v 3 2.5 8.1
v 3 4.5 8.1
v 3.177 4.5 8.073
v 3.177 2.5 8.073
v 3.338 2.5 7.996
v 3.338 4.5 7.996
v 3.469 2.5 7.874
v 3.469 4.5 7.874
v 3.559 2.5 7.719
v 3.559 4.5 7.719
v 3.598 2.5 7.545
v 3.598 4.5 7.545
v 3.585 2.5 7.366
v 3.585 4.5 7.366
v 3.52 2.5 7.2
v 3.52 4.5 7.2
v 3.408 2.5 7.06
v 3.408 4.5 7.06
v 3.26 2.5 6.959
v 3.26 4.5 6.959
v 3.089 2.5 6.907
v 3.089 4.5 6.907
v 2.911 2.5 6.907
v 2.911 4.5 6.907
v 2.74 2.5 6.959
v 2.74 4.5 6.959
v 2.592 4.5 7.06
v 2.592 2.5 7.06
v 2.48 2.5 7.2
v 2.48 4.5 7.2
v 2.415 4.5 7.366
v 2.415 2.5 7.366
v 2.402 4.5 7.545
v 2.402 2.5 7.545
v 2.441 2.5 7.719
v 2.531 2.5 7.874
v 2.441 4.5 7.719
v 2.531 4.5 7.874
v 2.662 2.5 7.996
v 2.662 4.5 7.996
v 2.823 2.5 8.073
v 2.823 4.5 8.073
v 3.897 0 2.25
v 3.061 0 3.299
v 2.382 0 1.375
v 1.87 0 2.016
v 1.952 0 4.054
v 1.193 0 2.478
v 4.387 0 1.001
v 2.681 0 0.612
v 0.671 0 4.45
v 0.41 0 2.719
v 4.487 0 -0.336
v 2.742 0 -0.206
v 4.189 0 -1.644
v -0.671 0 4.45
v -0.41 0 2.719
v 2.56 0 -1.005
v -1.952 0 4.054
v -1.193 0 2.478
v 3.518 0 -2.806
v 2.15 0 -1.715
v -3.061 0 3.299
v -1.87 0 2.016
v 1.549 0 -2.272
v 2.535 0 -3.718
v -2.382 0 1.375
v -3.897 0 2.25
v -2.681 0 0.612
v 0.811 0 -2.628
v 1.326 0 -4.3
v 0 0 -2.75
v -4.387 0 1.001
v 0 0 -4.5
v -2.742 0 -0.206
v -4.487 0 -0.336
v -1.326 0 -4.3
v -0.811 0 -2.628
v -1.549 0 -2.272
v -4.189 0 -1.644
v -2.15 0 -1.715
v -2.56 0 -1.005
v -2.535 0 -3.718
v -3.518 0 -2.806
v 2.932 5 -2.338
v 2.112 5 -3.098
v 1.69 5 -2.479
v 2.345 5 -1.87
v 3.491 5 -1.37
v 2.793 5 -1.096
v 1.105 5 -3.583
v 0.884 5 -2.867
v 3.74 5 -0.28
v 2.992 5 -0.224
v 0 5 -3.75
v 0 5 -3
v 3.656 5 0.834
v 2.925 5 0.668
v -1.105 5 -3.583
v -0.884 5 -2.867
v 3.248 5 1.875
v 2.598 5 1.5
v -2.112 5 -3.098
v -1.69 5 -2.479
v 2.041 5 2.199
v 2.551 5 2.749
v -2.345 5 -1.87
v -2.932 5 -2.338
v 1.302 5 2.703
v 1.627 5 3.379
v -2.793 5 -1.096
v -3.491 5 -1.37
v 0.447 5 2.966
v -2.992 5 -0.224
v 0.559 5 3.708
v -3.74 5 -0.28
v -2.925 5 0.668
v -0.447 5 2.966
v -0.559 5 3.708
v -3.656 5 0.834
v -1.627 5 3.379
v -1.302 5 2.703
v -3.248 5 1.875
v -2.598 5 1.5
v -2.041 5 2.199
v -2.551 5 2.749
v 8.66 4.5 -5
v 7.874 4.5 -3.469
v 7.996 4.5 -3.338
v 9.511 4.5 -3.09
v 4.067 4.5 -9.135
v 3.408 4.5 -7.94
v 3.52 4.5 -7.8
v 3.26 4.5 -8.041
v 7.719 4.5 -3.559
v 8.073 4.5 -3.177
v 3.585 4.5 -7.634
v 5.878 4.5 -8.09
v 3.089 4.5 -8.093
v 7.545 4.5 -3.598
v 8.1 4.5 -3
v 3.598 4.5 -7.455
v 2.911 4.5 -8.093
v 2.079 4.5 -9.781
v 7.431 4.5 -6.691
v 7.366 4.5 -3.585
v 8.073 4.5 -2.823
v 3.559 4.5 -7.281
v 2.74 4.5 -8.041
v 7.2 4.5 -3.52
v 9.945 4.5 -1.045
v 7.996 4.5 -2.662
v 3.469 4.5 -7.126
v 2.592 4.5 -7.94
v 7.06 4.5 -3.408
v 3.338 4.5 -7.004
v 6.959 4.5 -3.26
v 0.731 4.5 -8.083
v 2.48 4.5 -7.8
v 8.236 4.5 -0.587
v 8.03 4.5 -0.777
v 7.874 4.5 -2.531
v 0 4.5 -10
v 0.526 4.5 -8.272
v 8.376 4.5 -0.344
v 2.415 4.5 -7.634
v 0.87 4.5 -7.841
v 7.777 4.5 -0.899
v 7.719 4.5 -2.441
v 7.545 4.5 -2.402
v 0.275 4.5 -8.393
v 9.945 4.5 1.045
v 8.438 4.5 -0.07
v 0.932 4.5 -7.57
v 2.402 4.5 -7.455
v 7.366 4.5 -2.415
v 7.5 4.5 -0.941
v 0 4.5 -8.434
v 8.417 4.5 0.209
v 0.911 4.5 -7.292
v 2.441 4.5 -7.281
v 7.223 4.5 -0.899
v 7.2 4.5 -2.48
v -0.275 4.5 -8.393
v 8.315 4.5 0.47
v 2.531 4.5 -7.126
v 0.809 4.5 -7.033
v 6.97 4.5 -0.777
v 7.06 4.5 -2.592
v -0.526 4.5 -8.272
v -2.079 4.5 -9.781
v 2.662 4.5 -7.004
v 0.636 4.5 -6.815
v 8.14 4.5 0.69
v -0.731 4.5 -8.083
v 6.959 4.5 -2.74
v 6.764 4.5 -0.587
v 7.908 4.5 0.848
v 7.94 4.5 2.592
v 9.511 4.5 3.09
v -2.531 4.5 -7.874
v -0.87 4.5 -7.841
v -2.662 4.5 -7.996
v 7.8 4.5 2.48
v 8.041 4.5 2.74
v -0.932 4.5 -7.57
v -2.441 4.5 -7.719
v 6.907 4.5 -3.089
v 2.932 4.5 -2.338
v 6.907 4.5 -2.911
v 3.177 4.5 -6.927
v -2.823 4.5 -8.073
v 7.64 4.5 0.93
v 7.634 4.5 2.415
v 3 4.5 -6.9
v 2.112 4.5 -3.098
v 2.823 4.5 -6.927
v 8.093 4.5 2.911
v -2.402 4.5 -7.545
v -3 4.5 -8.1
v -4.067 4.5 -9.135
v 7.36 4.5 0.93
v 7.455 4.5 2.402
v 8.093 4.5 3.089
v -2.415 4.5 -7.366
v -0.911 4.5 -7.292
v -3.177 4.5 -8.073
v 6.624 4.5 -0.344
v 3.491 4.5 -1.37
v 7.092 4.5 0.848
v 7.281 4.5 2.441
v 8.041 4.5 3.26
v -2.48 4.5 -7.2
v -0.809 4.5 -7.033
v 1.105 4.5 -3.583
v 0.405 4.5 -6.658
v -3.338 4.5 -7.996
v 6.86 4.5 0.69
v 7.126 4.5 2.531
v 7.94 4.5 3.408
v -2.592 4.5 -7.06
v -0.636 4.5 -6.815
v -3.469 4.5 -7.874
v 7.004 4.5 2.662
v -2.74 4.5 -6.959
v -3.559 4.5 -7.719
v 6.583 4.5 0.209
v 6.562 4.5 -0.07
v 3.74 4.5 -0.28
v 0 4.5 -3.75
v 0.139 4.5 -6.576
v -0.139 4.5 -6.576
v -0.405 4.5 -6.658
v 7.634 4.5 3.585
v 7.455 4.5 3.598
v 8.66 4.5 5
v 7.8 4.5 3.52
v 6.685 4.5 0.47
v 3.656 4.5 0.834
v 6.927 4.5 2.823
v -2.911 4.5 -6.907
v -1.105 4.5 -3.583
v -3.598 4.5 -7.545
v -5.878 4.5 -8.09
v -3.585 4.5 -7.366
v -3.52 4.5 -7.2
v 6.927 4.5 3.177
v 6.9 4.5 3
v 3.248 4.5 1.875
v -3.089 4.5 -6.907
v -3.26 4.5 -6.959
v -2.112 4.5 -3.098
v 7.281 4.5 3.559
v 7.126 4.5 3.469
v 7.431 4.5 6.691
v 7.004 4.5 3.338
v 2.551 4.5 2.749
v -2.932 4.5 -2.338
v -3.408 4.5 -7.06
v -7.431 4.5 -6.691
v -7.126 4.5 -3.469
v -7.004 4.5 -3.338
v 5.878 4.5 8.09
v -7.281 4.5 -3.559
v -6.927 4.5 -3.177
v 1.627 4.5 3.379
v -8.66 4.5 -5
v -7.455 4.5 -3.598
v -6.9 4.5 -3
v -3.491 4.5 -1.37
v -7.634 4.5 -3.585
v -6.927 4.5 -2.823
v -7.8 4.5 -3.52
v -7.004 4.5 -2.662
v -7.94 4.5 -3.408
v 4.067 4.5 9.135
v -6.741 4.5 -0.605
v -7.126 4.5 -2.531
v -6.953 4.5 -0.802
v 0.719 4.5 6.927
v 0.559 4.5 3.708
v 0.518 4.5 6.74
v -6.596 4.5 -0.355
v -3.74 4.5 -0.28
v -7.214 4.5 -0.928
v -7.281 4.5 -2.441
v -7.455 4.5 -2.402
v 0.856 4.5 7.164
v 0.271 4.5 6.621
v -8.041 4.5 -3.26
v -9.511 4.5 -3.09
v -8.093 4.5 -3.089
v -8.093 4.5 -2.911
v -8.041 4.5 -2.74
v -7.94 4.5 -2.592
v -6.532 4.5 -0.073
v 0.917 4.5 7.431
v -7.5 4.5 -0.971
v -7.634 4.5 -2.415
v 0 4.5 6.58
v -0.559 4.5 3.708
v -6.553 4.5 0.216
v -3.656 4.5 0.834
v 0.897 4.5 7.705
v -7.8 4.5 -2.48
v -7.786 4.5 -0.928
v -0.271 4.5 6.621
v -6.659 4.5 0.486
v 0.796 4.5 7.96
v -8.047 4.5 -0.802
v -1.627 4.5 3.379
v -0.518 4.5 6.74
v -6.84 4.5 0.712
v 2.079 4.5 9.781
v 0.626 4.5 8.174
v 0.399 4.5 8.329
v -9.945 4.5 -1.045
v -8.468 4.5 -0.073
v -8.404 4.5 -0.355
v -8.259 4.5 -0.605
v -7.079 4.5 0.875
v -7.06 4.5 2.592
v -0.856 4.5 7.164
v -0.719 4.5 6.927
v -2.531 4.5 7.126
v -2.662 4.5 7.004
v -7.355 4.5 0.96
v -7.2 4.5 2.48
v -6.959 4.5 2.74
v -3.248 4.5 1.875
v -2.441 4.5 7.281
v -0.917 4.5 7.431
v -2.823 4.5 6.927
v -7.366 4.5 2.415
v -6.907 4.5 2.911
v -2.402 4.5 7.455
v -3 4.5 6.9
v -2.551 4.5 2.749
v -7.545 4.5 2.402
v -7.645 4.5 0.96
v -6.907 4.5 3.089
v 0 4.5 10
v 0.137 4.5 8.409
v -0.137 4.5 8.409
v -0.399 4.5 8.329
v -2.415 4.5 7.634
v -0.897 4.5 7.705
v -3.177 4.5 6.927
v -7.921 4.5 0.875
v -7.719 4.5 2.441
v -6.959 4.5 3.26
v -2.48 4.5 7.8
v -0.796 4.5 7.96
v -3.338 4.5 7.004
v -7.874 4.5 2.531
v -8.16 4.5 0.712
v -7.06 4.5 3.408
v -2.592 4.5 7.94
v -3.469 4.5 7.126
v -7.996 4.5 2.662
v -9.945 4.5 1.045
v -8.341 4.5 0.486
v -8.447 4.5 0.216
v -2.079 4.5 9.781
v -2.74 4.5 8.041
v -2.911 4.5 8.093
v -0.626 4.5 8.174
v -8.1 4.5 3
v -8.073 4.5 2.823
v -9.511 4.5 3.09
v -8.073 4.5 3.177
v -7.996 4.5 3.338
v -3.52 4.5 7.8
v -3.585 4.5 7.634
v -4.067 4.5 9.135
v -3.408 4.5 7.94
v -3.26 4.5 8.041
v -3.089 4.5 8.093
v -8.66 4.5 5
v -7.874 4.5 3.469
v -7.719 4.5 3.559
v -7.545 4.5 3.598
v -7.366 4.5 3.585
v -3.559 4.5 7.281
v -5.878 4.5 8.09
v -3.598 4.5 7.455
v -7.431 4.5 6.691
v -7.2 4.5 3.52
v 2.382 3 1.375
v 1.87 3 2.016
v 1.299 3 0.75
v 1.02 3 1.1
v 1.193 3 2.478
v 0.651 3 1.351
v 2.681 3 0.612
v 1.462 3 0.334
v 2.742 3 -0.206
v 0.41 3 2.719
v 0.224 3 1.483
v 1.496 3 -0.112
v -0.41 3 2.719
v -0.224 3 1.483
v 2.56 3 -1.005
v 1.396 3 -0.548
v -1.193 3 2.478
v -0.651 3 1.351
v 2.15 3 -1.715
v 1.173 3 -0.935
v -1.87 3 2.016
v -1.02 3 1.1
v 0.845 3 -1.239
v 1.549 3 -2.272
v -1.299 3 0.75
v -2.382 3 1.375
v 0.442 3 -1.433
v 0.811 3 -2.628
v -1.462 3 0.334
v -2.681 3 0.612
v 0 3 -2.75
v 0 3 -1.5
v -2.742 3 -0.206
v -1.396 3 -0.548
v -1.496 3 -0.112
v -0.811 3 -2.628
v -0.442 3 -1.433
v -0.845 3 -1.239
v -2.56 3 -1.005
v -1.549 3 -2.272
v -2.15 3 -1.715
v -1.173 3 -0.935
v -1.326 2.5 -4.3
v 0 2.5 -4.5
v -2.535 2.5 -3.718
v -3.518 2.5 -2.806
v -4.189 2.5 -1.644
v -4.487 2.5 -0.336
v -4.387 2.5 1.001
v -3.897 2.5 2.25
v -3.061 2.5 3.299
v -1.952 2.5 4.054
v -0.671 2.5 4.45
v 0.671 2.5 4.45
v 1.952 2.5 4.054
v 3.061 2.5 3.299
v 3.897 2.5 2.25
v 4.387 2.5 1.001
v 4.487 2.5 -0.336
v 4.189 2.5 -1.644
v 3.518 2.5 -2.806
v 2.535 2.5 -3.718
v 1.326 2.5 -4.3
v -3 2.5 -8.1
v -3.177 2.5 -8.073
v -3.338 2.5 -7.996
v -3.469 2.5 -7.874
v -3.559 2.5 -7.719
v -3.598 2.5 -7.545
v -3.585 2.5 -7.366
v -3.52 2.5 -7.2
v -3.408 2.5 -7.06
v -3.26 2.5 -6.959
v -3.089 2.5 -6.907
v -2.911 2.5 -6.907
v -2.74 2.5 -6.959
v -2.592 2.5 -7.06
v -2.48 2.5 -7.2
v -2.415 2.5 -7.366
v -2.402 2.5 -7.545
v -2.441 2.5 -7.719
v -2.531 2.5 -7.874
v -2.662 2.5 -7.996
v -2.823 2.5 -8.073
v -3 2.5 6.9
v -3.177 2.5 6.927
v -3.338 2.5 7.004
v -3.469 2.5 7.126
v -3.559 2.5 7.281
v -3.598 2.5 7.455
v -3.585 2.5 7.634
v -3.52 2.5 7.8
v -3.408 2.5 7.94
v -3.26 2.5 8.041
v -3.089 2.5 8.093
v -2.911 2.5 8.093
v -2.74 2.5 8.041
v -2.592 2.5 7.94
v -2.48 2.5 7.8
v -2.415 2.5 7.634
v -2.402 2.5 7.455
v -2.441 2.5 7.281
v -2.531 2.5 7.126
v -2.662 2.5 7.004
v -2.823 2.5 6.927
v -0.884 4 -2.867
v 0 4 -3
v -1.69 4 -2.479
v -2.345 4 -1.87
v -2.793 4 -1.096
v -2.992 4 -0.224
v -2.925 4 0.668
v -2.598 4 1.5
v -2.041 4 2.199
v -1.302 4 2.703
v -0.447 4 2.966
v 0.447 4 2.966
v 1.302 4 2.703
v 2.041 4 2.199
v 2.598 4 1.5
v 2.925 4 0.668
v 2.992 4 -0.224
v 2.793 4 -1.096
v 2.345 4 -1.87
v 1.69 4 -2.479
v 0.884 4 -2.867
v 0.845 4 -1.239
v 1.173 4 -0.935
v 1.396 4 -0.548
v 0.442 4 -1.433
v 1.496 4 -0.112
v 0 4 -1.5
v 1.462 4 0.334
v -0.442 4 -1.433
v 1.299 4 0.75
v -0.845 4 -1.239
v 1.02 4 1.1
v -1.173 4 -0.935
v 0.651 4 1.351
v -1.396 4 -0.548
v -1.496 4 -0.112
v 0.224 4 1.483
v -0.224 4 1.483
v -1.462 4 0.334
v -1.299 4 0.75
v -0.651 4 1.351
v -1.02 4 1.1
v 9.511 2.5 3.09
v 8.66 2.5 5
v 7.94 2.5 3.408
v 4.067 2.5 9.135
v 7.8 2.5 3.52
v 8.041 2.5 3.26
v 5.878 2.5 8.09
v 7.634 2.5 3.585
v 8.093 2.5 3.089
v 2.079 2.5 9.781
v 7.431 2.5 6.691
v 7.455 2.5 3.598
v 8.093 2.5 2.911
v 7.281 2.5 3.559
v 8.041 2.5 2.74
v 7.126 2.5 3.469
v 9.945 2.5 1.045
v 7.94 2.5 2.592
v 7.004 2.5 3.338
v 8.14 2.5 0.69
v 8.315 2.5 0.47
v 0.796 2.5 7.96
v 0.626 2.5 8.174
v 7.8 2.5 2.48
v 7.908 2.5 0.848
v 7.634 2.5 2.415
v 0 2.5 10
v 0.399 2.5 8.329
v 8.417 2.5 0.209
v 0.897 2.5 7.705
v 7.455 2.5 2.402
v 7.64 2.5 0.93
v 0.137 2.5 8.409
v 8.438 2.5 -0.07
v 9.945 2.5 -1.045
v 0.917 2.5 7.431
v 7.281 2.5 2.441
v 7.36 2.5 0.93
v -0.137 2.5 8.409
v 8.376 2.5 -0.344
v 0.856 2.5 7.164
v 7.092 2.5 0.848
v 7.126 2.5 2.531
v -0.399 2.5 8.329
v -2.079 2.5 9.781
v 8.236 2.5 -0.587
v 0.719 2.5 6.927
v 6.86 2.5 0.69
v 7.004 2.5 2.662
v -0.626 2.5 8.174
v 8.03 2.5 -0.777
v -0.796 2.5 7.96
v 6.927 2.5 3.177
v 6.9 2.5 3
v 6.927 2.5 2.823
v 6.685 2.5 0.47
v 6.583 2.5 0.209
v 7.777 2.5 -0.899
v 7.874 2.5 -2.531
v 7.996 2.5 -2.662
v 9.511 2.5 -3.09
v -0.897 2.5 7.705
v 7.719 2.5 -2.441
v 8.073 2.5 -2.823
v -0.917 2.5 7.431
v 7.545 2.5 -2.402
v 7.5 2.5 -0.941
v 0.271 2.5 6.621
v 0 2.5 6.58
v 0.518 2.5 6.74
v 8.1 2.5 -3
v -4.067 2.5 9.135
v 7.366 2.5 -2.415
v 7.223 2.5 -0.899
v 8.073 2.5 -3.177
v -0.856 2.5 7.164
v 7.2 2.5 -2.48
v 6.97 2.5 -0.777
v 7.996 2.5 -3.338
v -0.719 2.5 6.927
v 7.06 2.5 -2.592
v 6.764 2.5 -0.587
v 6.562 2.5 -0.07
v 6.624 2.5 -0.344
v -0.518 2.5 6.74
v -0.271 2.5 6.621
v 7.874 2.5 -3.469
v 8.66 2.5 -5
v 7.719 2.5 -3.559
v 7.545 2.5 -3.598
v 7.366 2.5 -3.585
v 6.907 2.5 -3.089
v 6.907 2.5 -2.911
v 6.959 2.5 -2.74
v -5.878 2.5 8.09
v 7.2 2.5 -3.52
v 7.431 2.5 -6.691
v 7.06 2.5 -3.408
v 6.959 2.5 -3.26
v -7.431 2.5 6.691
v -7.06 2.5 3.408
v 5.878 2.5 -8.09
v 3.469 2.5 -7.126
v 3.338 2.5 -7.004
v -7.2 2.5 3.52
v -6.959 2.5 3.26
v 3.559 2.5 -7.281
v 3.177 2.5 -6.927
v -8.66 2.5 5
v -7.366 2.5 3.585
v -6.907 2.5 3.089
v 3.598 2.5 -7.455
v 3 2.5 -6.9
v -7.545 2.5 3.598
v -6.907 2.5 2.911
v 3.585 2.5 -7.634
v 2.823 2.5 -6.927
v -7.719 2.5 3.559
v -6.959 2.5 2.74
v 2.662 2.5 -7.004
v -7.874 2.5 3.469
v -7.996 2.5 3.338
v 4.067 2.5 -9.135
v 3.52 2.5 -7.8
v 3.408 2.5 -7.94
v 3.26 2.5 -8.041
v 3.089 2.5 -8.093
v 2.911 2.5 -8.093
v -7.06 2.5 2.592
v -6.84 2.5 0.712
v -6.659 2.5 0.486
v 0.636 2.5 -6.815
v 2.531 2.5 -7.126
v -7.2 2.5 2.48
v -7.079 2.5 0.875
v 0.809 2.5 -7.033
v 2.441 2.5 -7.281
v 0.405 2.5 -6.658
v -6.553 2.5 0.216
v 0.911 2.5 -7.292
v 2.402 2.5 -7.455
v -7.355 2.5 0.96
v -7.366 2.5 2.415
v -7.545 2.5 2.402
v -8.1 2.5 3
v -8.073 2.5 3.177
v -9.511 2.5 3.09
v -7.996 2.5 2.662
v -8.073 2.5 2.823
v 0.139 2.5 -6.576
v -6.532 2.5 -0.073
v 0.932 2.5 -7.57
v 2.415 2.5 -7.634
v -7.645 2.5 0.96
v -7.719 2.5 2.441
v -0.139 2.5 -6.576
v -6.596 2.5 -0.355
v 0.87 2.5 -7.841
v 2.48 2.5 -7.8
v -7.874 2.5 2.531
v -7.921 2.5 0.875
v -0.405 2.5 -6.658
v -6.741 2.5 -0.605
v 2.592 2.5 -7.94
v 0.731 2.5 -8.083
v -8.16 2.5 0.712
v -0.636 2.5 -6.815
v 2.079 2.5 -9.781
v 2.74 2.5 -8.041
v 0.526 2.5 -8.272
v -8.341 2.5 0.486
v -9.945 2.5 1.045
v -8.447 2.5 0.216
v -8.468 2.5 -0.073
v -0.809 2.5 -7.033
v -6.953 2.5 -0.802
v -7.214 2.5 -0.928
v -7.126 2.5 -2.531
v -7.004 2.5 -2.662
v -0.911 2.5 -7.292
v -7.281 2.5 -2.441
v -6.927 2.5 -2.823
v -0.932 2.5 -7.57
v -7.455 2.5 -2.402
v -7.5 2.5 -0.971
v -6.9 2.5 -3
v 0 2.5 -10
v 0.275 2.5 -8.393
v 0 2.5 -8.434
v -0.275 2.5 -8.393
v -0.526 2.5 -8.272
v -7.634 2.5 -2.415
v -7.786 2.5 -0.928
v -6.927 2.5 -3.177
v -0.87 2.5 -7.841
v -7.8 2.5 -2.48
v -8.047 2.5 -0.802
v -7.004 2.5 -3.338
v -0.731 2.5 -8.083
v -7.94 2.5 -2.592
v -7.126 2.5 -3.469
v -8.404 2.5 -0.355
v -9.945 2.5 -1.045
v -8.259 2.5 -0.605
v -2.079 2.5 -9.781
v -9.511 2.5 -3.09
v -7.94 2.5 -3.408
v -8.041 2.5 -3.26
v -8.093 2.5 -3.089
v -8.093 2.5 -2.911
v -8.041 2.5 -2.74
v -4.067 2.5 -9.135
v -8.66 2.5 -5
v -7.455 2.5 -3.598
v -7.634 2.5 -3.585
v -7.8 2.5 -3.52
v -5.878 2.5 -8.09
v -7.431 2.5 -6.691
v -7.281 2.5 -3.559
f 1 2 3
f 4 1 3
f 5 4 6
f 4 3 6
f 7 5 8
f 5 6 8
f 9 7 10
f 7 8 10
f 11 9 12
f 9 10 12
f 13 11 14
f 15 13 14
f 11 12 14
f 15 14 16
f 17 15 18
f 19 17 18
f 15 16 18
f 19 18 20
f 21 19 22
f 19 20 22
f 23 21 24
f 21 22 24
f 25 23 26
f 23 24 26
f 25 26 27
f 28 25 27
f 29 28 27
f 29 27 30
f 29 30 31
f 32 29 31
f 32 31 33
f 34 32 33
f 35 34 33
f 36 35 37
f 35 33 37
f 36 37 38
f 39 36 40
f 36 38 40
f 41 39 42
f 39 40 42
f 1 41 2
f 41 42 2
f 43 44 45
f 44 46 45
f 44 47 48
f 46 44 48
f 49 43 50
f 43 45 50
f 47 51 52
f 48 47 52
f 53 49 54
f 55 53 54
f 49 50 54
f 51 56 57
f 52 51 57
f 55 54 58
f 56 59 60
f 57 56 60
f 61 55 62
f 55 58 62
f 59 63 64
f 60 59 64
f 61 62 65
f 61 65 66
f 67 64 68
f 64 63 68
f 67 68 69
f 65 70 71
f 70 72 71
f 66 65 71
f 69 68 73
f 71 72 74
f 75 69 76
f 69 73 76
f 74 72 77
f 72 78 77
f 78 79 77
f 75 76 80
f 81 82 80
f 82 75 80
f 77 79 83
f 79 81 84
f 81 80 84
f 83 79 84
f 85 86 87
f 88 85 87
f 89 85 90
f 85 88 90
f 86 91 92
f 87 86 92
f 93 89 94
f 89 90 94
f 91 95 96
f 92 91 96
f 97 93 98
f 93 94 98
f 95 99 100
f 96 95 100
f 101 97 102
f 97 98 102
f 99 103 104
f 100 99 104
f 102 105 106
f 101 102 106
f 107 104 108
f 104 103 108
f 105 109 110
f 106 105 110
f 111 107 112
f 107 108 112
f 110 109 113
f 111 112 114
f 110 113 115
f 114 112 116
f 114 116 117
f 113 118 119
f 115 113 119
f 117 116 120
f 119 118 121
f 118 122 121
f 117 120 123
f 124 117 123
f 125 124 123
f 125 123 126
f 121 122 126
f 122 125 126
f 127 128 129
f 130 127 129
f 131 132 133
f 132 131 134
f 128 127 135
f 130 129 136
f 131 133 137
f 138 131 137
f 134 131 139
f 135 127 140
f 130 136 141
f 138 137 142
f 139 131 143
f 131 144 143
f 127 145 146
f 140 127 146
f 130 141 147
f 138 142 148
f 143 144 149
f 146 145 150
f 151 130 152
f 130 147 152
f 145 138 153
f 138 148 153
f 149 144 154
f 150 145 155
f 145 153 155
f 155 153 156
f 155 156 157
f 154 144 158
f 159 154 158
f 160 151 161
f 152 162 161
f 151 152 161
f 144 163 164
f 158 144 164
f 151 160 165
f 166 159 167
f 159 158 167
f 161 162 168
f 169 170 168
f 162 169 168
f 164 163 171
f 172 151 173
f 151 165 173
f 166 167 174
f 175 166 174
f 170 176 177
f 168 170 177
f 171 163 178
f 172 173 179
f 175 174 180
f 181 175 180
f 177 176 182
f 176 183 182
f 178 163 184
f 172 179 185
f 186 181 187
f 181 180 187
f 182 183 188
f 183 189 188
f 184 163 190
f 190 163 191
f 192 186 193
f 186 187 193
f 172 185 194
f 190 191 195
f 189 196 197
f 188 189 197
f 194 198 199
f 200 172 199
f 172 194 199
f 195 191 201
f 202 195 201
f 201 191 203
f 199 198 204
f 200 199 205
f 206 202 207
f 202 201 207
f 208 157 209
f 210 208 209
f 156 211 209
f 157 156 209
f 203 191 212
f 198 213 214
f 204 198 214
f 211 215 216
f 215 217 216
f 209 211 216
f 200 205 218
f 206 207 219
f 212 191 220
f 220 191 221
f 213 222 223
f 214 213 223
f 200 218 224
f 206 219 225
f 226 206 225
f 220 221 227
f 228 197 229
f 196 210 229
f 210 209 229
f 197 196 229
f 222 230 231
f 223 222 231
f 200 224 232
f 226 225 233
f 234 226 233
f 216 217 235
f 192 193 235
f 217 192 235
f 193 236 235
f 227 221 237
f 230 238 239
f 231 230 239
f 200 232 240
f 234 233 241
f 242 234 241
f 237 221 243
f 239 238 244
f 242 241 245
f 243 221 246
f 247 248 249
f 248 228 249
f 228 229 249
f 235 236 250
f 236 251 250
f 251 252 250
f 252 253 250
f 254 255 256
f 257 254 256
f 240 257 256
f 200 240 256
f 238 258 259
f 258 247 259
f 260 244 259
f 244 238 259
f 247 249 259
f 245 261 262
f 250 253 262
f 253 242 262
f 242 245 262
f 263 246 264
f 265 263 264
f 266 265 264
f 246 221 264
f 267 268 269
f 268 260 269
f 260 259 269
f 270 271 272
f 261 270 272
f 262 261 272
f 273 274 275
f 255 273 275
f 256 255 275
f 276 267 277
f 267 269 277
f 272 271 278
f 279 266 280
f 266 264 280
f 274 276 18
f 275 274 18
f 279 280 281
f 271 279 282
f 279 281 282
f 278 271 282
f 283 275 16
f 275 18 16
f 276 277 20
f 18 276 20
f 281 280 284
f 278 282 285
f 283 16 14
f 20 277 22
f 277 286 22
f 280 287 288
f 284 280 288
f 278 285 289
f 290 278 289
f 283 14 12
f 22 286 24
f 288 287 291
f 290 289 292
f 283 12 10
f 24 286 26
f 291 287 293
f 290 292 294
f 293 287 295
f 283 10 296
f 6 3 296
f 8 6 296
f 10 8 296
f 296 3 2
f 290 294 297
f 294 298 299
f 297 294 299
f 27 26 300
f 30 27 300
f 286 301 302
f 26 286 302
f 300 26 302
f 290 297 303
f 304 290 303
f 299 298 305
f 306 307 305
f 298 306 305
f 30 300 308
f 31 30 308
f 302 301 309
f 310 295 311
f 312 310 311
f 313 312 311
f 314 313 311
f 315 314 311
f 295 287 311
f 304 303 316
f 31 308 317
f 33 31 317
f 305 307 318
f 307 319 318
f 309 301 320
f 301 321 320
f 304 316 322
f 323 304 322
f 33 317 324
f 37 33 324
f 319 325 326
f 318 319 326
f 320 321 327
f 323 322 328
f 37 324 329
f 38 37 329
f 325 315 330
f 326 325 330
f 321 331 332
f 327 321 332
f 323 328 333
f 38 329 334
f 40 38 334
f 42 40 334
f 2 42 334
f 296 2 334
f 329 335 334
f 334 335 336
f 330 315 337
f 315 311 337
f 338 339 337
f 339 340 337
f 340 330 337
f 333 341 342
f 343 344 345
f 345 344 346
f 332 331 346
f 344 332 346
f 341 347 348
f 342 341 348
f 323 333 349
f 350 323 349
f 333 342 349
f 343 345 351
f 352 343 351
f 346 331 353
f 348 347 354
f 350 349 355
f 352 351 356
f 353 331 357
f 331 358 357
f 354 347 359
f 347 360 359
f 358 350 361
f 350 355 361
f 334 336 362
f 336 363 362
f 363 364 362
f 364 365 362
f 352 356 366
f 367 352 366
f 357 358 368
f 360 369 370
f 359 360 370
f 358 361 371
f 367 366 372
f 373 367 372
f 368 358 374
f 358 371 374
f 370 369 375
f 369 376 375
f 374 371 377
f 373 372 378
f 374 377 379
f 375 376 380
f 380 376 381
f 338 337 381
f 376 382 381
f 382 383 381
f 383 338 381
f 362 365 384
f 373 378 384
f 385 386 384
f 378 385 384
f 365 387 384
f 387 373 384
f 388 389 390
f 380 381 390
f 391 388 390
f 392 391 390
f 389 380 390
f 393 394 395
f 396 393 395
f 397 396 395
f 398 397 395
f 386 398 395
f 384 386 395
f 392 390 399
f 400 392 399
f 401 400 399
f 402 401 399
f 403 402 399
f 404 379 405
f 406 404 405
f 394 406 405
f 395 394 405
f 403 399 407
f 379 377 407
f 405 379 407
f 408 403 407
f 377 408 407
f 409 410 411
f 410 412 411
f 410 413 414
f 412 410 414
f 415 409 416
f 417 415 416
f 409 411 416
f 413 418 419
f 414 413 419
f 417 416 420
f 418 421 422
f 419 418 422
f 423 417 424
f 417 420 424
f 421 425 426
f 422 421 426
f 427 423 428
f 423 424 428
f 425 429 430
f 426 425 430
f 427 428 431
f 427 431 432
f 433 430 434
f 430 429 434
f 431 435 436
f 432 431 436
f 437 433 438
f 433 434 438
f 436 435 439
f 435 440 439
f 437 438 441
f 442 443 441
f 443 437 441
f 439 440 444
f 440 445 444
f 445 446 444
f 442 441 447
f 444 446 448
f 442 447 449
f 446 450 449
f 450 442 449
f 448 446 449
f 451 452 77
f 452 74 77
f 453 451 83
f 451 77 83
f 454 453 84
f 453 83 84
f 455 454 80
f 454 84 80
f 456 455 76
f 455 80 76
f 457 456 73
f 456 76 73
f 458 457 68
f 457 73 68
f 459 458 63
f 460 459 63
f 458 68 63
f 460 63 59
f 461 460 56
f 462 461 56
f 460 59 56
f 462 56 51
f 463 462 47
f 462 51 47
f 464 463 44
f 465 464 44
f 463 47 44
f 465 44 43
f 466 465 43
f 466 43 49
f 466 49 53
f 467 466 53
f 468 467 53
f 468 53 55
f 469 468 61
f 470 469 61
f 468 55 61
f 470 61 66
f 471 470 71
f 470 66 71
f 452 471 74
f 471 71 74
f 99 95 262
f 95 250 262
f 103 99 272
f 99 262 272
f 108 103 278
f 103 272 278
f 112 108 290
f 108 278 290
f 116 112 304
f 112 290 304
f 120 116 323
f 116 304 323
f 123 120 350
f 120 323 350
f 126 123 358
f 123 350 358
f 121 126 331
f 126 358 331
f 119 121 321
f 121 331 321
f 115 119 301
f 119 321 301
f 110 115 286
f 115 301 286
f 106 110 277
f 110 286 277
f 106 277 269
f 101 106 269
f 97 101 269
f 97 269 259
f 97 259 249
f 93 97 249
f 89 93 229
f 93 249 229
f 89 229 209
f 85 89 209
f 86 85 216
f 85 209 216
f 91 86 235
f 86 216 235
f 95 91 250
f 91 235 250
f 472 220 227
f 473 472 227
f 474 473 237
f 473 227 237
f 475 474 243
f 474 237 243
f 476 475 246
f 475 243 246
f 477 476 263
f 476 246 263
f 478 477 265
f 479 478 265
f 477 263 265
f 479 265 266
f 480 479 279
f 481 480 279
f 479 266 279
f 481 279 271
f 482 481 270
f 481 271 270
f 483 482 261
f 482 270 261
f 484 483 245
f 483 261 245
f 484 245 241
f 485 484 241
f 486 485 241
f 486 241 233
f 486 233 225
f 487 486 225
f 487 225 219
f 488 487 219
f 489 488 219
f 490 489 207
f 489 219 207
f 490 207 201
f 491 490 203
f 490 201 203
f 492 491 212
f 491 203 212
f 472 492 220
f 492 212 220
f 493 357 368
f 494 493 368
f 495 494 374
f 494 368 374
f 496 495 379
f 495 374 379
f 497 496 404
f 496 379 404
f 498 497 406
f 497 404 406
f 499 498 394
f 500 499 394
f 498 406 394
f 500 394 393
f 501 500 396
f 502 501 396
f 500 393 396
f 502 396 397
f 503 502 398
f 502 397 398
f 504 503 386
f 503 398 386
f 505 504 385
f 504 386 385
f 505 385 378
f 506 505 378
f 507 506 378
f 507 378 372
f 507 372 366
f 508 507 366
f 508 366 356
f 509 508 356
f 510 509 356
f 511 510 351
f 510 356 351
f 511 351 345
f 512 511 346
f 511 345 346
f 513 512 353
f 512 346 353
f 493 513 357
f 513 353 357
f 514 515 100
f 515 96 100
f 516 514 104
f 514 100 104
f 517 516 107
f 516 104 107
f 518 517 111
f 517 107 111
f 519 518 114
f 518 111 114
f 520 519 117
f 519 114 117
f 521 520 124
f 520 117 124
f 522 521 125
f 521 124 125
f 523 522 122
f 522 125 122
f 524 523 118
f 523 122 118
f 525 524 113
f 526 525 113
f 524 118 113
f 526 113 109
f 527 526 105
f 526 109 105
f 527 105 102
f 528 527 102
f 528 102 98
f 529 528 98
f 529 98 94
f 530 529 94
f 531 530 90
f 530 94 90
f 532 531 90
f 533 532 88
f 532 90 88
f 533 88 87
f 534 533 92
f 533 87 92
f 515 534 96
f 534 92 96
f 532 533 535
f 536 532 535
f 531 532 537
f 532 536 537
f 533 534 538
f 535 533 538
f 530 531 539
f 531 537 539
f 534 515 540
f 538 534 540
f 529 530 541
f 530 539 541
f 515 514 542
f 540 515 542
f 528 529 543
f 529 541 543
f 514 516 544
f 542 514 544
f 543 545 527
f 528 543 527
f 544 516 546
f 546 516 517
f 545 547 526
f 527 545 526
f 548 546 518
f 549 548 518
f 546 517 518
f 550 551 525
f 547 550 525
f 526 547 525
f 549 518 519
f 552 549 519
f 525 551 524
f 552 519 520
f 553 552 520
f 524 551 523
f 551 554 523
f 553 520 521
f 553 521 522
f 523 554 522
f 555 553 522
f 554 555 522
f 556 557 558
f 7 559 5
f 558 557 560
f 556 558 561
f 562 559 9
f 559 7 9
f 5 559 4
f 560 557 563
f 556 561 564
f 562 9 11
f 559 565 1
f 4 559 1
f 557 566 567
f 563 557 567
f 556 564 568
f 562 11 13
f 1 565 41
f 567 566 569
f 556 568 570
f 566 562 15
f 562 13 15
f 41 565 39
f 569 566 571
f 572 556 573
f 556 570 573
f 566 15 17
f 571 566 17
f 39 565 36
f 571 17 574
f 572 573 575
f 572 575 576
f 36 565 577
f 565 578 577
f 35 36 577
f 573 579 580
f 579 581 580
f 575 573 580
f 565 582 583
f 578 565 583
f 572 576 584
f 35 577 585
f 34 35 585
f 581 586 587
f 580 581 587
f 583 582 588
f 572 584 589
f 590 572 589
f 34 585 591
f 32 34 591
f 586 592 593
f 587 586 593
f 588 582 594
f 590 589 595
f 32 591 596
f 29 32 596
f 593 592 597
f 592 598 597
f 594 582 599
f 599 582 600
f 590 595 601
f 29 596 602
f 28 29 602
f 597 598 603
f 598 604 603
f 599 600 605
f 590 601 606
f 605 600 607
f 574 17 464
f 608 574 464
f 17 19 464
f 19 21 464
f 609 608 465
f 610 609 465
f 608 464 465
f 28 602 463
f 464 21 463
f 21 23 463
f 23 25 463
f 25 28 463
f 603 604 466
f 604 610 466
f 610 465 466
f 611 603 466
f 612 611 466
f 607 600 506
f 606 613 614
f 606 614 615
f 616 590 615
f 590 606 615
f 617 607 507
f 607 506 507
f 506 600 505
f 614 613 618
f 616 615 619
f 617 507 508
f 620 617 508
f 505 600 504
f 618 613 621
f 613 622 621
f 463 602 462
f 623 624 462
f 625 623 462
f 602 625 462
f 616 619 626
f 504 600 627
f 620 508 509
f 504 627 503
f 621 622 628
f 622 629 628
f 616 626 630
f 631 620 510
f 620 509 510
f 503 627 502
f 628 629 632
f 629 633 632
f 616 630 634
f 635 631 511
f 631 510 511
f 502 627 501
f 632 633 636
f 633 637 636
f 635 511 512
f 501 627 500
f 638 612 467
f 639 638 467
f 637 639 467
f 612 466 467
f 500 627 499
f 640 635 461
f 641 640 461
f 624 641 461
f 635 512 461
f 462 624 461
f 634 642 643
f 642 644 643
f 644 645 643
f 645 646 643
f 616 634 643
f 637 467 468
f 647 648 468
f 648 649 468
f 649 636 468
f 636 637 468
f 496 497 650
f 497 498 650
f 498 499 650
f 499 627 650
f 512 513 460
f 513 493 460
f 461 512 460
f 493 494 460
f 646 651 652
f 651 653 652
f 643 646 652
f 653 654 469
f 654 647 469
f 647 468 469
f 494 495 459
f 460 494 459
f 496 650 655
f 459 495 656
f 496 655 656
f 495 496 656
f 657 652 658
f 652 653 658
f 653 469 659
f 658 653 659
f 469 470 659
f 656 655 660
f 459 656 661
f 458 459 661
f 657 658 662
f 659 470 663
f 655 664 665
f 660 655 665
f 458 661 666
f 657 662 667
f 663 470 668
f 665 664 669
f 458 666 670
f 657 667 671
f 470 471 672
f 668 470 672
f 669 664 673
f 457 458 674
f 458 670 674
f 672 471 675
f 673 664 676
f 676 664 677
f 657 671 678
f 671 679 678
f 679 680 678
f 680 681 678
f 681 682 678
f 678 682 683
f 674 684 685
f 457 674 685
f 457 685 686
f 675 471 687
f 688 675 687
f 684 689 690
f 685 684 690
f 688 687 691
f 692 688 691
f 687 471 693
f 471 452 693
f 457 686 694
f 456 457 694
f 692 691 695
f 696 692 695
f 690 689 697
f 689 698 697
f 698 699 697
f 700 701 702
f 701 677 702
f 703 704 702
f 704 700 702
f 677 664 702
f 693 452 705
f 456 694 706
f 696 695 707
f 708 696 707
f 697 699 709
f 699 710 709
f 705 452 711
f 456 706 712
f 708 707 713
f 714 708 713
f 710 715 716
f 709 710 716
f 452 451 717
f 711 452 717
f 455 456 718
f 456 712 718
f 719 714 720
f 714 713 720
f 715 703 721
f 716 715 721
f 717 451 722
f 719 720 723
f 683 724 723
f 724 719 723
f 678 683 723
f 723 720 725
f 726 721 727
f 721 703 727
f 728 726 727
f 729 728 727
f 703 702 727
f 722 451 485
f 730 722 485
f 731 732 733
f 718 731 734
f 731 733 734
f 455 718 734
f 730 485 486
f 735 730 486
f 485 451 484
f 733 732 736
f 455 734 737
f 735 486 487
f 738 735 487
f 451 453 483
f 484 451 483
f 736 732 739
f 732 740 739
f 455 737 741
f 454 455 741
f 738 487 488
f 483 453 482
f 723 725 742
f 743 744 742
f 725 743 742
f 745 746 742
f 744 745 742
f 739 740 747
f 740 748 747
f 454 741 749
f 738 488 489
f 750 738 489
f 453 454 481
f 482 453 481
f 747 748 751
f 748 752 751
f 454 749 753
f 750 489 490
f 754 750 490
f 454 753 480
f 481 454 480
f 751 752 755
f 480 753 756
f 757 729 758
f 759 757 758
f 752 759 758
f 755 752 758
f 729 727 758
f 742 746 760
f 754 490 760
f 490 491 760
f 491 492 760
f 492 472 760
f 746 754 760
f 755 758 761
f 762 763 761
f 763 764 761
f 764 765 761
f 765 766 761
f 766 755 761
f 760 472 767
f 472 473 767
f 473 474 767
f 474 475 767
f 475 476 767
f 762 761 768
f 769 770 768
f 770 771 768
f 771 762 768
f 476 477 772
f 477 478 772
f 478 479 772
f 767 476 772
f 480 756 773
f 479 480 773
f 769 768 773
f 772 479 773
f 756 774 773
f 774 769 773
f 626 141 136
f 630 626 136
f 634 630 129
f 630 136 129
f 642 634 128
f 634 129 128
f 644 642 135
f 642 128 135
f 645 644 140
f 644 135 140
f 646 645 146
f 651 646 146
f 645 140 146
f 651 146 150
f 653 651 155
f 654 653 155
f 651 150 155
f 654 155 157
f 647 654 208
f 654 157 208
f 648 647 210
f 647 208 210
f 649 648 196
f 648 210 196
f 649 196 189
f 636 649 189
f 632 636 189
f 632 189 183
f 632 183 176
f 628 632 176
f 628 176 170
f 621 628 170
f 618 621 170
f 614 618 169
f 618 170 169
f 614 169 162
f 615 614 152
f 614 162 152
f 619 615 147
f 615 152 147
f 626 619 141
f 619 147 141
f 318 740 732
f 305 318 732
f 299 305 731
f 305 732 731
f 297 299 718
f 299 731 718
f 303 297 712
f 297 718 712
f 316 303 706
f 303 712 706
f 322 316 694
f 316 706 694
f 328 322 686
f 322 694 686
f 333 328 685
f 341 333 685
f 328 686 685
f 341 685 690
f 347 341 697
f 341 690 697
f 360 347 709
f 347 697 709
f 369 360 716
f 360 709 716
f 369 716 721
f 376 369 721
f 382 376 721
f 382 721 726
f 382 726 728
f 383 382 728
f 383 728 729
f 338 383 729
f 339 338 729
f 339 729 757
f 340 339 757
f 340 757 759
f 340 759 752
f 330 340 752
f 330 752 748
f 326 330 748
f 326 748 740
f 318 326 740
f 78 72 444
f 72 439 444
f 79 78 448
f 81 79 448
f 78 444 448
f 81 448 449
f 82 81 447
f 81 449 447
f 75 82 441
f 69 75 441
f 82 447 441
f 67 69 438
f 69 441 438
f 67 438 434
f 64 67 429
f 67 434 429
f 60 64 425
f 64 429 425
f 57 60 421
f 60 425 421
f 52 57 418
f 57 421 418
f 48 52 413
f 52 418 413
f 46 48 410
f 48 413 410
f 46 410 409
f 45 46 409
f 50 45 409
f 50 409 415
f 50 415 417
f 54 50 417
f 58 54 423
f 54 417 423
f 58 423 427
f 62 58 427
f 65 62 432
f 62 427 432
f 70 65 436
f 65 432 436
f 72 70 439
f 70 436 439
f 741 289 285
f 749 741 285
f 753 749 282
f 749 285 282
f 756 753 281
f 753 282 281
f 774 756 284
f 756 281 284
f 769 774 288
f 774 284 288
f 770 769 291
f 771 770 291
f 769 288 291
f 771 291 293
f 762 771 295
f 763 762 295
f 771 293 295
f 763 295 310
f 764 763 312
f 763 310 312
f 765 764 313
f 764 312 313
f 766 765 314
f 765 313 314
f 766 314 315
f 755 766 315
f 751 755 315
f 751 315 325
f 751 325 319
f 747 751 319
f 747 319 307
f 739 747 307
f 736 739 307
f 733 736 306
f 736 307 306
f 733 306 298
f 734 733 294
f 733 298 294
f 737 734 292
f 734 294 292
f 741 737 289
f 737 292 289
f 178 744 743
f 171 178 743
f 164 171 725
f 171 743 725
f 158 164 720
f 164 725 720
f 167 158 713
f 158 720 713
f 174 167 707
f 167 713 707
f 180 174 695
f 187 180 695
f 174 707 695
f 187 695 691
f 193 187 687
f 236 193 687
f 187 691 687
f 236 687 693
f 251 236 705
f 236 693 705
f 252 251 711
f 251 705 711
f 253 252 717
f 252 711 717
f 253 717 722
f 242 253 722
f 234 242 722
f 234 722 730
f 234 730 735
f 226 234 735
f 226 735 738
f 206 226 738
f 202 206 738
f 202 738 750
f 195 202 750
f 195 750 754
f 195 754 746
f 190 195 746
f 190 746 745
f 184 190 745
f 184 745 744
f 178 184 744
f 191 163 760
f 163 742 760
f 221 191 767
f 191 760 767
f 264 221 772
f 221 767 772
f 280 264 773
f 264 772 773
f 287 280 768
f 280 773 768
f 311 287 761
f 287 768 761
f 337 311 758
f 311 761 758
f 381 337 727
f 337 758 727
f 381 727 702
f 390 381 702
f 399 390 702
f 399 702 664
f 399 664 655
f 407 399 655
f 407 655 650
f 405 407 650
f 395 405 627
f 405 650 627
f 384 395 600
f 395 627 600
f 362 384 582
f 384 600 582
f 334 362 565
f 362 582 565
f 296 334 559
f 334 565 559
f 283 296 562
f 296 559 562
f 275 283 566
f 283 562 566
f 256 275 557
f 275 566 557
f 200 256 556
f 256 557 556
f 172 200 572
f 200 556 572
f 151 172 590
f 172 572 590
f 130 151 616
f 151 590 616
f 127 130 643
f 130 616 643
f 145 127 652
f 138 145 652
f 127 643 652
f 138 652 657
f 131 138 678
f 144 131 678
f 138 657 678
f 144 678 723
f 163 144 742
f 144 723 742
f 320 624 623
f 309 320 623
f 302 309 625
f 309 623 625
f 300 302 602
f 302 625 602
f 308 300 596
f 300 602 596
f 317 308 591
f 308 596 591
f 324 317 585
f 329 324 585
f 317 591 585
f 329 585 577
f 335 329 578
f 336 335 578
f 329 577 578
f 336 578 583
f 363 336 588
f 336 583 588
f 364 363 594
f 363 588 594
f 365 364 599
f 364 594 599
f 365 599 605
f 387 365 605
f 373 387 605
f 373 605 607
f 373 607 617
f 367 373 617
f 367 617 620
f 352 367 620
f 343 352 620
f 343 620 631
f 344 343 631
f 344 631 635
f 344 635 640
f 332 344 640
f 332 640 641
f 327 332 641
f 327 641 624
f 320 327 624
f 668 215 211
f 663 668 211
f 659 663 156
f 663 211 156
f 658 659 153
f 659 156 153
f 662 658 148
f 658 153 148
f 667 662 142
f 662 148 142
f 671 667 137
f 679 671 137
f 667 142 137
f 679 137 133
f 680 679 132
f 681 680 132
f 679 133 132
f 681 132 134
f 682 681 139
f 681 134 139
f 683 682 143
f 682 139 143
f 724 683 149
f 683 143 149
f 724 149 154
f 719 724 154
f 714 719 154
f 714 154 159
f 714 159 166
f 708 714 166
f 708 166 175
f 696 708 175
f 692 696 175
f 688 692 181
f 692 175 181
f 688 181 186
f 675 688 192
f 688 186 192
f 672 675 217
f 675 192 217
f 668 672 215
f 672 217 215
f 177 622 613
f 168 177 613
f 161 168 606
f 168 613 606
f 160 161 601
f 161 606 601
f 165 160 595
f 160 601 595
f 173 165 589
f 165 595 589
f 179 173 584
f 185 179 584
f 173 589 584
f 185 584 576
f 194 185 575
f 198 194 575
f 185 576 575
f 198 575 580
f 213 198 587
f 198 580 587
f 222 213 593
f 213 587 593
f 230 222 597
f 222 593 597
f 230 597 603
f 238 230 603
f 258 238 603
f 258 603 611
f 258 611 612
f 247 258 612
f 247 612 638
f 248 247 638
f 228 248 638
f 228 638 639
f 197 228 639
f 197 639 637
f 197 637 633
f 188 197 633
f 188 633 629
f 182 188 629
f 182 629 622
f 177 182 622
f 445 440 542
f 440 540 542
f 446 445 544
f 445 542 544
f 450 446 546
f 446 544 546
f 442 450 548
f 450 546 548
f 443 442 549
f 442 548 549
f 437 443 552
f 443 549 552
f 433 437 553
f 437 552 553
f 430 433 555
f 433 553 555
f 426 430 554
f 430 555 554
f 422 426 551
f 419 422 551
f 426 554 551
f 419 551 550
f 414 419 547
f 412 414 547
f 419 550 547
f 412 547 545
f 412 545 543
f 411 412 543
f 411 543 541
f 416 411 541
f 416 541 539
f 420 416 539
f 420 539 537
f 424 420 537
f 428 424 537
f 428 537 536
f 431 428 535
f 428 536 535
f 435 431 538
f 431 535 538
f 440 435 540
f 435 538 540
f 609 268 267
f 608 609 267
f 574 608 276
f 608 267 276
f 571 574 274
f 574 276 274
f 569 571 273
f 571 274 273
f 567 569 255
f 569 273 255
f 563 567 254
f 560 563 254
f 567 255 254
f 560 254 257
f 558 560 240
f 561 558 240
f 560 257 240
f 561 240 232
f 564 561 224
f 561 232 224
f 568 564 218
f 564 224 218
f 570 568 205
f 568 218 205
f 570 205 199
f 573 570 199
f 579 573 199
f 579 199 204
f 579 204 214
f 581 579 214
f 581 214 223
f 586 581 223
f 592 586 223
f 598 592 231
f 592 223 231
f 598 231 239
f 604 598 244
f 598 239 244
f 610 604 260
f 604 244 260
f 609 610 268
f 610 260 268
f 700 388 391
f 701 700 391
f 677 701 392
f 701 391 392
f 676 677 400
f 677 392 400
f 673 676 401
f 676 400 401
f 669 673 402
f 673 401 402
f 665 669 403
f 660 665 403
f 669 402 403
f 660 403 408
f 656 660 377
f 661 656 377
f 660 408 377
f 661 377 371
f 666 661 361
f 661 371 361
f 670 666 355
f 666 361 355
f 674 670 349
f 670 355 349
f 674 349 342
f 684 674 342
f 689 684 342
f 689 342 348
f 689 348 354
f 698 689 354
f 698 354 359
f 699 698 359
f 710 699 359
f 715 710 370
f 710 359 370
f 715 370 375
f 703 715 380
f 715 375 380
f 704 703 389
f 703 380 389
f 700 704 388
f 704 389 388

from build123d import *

# Parameters (mm, degrees)
SKETCH1_R               = 0.6
CUT_EXTRUDE1_DEPTH      = 2
CIRPATTERN1_COUNT       = 4
ESQUISSE2_R             = 0.934495928
ESQUISSE2_R_2           = 0.971023647
ESQUISSE2_R_3           = 0.919680735
ESQUISSE2_R_4           = 0.940854572
ENL_V_MAT_EXTRU_1_DEPTH = 15.361406616


with BuildPart() as part:
    # Esquisse1 → Révolution1 (revolve)
    with BuildSketch(Plane.XY, mode=Mode.PRIVATE) as r_volution1_sk:
        Polygon((2.75, 0), (2.75, 3), (1.5, 3), (1.5, 4), (3, 4), (3, 5), (3.75, 5), (3.75, 4.5), (10, 4.5), (10, 2.5), (4.5, 2.5), (4.5, 0), align=None)
    revolve(r_volution1_sk.sketch.rotate(Axis((0, 0, 0), (0, 1, 0)), 90), axis=Axis((0, 0, 0), (0, 1, 0)))

    # Sketch1 → Cut-Extrude1 (cut)
    with BuildSketch(Plane(origin=(0, 4.5, 0), x_dir=(1, 0, 0), z_dir=(0, 1, 0))):
        with Locations(Location((0, 7.5, 0), (0, 0, 270))):
            Circle(SKETCH1_R)
        with Locations(Location((3, 7.5, 0), (0, 0, 270))):
            Circle(SKETCH1_R)
        with Locations(Location((-3, 7.5, 0), (0, 0, 90))):
            Circle(SKETCH1_R)
    cut_extrude1 = extrude(amount=-CUT_EXTRUDE1_DEPTH, mode=Mode.SUBTRACT)

    # CirPattern1: Cut-Extrude1 ×4 about axis
    cirpattern1_axis = Axis((0, 0, 0), (0, 1, 0))
    for i in range(1, CIRPATTERN1_COUNT):
        add(cut_extrude1.rotate(cirpattern1_axis, i * 360 / CIRPATTERN1_COUNT), mode=Mode.SUBTRACT)

    # Esquisse2 → Enlèv. mat.-Extru.1 (cut, through all)
    with BuildSketch(Plane.XZ.offset(-2.5)):
        with Locations(Location((0, -7.5, 0), (0, 0, 270))):
            Circle(ESQUISSE2_R)
        with Locations(Location((-7.5, 0, 0), (0, 0, 270))):
            Circle(ESQUISSE2_R_2)
        with Locations(Location((0, 7.5, 0), (0, 0, 270))):
            Circle(ESQUISSE2_R_3)
        with Locations(Location((7.5, 0, 0), (0, 0, 270))):
            Circle(ESQUISSE2_R_4)
    extrude(amount=-ENL_V_MAT_EXTRU_1_DEPTH, mode=Mode.SUBTRACT)


solid = part.part
